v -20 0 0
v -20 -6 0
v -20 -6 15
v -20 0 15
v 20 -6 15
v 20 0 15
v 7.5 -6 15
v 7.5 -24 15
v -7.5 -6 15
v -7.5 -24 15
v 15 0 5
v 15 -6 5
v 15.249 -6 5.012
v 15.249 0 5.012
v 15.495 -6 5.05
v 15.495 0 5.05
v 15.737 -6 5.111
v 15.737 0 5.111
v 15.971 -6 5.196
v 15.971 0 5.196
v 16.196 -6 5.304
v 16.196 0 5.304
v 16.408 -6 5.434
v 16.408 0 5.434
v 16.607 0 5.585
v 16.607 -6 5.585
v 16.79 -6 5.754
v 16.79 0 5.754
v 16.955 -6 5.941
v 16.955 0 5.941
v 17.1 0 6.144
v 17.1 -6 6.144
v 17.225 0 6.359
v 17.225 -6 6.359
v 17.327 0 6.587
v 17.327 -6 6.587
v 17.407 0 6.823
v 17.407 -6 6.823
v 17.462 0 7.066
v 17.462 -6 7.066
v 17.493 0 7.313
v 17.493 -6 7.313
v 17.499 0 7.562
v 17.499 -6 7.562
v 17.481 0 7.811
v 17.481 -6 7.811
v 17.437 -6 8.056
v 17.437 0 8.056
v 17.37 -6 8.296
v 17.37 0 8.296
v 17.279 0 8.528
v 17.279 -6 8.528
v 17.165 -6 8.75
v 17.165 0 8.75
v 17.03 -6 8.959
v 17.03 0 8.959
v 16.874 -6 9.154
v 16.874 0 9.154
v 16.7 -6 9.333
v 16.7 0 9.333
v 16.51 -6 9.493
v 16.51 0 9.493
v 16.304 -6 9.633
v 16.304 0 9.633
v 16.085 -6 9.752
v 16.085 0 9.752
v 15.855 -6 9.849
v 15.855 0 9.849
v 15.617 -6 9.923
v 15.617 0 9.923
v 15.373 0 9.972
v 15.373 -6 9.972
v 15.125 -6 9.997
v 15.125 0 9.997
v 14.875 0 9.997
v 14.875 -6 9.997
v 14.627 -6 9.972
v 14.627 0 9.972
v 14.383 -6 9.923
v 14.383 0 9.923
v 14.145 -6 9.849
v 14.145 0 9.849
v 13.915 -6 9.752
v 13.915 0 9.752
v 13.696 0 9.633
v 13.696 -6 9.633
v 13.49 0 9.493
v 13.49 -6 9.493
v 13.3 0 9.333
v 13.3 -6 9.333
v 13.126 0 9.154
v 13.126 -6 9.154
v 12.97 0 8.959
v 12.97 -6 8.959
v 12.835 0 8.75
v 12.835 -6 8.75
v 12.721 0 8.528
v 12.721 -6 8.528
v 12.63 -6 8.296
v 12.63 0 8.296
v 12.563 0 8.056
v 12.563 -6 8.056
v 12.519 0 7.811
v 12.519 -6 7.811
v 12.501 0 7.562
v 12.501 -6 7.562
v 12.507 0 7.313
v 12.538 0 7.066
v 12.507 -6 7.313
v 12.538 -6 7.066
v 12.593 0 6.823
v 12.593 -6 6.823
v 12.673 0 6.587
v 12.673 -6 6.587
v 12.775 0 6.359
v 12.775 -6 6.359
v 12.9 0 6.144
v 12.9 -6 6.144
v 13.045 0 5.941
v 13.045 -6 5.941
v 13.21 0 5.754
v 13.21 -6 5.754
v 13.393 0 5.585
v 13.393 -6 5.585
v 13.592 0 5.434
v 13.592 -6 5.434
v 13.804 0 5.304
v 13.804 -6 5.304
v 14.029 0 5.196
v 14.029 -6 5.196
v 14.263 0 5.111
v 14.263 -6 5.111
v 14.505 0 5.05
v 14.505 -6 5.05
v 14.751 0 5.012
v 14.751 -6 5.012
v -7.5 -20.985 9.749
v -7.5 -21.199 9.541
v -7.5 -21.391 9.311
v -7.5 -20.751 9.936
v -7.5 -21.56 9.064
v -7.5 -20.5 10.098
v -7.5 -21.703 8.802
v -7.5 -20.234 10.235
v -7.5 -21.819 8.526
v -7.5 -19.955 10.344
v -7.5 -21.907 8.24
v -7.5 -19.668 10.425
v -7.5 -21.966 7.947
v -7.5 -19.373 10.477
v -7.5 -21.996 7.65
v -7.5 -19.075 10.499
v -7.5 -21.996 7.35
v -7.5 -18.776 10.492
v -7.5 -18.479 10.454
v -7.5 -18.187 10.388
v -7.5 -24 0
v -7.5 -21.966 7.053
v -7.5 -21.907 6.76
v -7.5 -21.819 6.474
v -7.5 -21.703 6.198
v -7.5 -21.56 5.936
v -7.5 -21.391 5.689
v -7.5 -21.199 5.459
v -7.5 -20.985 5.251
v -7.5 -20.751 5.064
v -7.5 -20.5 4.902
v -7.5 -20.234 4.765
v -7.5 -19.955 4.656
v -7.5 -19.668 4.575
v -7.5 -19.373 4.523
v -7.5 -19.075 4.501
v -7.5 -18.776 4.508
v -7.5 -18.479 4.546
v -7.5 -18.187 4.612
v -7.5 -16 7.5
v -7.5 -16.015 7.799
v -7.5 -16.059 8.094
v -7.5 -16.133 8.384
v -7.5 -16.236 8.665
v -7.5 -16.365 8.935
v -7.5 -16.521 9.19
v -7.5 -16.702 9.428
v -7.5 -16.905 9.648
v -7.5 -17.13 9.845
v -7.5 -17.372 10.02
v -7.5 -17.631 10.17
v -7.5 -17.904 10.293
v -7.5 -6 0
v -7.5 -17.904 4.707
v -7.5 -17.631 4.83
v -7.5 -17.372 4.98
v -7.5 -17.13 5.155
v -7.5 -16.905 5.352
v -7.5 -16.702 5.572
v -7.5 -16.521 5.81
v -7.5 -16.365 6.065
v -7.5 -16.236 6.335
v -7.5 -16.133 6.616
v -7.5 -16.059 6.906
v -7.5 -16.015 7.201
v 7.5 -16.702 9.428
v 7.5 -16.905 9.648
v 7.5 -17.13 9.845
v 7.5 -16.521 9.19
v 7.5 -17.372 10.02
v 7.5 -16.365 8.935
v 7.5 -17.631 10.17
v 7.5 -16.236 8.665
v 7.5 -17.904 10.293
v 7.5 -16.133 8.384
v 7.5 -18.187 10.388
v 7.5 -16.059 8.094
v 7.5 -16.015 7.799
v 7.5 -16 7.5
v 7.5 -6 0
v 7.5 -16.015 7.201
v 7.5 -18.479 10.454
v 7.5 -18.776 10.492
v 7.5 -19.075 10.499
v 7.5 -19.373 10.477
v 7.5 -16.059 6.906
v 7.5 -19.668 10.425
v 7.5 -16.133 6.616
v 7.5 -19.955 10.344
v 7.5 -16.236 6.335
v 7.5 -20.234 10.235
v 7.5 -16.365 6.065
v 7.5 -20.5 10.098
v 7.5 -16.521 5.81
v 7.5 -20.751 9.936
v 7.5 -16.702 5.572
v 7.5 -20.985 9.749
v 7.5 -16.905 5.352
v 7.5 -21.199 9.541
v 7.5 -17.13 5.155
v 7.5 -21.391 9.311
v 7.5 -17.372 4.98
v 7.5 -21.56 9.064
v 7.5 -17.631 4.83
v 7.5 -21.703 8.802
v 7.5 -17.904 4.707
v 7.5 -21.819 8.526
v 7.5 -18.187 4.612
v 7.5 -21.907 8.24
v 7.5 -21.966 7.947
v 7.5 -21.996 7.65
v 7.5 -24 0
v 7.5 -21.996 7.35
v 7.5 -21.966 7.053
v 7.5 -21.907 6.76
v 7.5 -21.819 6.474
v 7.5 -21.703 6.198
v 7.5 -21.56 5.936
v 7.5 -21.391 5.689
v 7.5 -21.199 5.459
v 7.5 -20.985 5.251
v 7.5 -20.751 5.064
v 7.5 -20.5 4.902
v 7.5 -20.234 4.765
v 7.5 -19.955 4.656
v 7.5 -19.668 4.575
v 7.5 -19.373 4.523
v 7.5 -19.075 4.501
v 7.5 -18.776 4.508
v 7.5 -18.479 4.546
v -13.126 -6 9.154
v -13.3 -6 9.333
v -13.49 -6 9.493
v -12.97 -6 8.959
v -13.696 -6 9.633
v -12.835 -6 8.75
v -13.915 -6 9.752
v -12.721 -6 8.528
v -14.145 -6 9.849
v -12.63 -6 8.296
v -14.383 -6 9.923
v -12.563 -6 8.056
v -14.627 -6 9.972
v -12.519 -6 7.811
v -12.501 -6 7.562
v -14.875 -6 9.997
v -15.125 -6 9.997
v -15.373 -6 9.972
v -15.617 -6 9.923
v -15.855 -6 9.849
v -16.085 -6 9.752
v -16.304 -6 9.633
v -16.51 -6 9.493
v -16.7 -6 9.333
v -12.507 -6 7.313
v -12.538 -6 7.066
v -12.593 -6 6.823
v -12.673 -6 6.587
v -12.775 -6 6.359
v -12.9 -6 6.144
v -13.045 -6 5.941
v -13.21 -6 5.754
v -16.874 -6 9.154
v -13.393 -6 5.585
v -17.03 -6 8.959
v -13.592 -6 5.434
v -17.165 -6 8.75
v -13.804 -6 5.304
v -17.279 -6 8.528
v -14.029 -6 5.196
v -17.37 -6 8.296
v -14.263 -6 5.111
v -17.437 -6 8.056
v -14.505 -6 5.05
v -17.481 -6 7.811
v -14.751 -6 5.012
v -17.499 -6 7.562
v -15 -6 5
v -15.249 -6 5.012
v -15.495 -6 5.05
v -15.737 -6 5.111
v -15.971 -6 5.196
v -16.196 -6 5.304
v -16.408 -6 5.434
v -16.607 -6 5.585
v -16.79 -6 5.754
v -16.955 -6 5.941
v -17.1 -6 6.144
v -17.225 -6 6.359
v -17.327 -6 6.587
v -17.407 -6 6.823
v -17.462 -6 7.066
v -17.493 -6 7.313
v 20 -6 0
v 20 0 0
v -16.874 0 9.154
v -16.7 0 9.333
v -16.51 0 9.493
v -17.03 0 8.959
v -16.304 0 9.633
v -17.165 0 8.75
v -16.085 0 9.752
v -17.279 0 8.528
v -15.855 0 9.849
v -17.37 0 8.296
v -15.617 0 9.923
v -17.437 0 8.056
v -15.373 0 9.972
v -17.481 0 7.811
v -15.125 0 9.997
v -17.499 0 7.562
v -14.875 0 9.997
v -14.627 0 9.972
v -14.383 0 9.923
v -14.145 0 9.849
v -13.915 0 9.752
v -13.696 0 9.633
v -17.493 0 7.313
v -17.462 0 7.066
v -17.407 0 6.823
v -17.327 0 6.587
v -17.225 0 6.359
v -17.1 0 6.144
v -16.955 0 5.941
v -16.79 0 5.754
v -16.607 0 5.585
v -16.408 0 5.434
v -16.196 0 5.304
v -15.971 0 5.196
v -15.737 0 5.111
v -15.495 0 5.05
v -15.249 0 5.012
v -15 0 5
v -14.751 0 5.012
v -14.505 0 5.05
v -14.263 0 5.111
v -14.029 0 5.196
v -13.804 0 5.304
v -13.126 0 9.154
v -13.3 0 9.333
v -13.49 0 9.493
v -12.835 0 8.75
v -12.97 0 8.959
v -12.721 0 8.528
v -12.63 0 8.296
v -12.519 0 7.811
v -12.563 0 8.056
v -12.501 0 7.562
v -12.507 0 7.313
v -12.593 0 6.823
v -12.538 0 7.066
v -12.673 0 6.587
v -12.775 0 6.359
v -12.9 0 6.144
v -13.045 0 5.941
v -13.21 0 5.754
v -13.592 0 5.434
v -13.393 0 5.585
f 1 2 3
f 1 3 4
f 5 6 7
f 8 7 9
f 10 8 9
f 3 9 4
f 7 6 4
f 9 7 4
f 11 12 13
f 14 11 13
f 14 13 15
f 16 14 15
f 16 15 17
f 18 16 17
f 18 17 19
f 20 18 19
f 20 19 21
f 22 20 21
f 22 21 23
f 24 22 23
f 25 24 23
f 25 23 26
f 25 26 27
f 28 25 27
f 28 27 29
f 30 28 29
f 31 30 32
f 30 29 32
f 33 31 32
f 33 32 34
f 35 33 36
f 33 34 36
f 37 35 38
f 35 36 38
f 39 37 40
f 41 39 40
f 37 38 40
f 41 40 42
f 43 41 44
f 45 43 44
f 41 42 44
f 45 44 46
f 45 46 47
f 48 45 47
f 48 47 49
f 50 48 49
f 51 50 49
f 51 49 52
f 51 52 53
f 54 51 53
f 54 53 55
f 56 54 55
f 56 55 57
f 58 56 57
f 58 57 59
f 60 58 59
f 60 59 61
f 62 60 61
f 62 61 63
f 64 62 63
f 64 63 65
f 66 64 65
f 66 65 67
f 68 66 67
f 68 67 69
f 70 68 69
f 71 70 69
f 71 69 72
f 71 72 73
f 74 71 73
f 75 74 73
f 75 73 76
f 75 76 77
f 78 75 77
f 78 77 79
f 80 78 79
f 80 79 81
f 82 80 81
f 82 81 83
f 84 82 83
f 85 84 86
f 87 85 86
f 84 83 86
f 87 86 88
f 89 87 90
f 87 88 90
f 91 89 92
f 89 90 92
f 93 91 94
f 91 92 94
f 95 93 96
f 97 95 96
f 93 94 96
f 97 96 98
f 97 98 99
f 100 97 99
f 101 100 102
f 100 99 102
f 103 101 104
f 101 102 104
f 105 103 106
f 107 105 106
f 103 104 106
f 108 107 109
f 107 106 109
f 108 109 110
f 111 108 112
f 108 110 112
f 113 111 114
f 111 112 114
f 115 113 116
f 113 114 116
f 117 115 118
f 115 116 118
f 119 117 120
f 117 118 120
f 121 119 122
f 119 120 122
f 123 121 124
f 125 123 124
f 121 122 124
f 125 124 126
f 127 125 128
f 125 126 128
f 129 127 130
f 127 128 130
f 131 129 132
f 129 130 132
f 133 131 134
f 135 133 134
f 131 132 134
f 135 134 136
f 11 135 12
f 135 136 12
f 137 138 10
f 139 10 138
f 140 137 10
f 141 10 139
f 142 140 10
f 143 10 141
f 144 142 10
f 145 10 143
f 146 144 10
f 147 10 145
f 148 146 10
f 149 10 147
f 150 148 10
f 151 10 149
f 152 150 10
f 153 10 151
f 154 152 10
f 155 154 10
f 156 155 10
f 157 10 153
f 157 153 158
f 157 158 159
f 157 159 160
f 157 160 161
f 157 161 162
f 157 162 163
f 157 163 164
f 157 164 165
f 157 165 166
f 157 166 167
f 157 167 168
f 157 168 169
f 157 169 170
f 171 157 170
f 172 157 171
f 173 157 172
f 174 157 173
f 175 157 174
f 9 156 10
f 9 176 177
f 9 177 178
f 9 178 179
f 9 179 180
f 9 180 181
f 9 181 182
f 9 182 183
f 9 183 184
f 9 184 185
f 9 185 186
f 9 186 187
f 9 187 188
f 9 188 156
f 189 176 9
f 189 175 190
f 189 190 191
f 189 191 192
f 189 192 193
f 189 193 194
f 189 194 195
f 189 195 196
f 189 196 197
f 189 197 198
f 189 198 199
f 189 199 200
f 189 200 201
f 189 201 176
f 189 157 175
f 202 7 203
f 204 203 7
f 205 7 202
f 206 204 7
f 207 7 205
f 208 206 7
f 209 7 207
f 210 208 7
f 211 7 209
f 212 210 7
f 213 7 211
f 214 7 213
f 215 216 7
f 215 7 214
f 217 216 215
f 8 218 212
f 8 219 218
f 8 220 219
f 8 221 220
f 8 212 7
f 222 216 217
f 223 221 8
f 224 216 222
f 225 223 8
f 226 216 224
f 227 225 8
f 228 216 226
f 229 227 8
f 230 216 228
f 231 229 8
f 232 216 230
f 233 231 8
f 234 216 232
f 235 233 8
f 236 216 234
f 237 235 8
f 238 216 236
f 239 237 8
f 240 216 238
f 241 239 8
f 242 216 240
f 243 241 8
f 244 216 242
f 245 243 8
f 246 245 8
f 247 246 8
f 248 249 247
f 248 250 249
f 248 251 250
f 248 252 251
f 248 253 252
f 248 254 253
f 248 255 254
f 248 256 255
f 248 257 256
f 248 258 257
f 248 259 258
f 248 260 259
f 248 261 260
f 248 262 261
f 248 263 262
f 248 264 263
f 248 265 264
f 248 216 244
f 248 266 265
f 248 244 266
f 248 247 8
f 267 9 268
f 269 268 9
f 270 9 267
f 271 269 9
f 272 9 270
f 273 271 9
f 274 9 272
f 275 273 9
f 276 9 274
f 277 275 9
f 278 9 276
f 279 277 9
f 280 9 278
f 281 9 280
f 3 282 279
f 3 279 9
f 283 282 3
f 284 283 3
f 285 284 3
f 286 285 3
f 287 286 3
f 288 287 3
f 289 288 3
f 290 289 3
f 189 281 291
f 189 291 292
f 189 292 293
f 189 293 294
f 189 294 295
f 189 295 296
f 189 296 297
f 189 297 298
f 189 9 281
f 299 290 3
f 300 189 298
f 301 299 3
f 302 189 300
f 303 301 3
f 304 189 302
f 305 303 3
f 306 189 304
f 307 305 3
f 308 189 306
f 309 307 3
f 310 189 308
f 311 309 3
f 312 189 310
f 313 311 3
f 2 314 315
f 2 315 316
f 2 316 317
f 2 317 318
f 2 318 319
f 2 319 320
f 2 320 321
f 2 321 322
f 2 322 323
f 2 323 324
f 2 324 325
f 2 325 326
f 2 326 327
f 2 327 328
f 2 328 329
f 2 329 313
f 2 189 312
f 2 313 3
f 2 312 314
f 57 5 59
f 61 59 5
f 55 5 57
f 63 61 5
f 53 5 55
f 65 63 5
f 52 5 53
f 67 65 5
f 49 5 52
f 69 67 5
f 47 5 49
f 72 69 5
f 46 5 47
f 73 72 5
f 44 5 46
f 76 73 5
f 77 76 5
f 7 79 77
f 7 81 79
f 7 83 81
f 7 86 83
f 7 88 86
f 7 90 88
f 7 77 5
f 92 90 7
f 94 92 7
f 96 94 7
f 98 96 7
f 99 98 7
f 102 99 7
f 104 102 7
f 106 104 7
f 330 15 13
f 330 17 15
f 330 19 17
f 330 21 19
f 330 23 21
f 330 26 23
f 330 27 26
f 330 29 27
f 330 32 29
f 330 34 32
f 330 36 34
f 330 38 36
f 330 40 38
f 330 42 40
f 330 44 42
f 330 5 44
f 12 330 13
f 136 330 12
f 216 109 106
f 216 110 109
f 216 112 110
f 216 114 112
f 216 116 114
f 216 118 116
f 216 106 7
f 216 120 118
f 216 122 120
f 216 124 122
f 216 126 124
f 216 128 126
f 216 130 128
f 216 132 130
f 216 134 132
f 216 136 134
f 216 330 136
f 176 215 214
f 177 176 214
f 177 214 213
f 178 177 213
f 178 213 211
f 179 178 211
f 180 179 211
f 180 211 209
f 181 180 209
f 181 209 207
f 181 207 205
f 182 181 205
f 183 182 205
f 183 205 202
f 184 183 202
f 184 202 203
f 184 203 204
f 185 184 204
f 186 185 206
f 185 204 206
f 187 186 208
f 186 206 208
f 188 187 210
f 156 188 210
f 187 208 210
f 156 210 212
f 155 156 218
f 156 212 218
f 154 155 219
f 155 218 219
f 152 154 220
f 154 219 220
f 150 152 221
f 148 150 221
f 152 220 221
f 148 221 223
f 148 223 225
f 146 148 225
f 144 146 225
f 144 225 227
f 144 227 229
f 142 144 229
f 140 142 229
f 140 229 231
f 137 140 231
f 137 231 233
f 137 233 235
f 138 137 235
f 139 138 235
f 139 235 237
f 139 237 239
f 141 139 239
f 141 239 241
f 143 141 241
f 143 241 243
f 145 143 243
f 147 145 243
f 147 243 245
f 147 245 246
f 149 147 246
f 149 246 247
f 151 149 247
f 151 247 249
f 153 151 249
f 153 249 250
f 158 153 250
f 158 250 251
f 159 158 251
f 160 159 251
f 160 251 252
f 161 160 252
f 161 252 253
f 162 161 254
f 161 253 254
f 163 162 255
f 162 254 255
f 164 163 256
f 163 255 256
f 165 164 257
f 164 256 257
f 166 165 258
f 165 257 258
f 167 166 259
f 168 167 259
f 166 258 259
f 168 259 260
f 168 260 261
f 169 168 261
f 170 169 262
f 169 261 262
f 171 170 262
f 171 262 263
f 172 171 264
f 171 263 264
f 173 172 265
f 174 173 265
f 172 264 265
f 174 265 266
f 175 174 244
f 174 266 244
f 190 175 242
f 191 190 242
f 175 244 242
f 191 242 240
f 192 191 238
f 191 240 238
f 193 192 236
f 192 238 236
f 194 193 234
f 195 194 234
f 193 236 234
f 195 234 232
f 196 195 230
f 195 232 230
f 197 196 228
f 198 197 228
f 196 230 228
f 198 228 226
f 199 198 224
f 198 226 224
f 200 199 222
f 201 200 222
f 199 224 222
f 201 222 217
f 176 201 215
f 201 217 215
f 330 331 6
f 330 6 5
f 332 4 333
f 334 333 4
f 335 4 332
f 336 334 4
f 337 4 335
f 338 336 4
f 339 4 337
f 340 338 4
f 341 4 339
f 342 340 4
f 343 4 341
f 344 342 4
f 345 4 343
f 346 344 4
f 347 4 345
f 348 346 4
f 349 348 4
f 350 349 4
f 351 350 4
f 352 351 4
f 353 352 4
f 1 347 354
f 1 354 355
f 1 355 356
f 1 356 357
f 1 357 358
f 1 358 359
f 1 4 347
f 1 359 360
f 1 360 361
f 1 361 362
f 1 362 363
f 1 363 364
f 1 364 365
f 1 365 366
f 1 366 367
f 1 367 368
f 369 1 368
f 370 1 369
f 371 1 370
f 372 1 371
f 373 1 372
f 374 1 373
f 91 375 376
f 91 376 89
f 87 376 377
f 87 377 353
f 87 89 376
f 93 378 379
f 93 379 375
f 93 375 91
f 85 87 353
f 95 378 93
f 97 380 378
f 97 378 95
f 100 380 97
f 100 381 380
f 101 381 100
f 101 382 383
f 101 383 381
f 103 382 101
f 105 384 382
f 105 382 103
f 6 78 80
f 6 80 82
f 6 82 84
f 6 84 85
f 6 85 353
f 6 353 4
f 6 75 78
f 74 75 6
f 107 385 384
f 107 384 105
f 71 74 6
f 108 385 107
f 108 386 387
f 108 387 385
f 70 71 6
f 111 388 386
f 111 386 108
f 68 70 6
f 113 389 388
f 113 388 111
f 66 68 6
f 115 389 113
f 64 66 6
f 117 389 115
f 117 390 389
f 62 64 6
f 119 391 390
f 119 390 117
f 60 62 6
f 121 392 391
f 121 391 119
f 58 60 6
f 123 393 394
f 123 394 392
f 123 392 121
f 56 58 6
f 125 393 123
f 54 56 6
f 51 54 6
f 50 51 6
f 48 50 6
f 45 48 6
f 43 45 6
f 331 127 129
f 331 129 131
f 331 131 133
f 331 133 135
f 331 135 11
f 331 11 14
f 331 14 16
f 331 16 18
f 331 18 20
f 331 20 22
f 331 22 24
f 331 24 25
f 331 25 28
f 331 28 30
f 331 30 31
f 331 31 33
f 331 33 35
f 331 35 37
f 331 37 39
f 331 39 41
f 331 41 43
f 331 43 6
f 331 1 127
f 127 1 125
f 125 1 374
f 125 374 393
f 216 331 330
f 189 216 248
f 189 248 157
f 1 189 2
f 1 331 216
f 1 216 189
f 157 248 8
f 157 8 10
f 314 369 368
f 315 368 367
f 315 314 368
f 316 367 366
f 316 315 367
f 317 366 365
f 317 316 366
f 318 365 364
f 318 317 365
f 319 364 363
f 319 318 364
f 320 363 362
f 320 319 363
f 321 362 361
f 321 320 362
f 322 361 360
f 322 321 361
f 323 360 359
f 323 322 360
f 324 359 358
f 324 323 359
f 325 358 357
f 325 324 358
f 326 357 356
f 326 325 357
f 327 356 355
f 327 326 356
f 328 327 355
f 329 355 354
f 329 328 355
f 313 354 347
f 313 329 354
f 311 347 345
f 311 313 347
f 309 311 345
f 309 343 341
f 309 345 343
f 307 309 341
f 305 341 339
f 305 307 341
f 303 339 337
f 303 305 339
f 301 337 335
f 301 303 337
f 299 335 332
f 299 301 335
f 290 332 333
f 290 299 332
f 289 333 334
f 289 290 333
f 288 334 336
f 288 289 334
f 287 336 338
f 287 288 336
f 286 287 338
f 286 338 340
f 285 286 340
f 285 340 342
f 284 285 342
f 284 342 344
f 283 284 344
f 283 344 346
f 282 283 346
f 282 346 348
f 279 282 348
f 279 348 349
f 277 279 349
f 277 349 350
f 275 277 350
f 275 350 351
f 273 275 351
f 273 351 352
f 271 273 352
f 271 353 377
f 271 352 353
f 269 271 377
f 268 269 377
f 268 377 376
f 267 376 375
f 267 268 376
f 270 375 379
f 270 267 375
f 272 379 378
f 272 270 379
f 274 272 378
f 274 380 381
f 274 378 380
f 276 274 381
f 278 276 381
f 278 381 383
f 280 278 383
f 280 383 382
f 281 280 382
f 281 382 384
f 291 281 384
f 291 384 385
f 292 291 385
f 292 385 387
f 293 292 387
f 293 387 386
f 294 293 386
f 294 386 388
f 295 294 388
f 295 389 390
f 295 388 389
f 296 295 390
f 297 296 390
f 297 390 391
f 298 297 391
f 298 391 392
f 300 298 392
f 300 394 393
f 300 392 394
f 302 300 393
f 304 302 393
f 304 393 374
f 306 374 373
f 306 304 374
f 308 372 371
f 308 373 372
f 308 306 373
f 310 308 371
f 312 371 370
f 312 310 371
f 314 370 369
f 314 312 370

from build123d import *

# Parameters (mm, degrees)
EXTRUDE_1_DEPTH     = 15
SKETCH_2_R          = 2.5
CUT_EXTRUDE_1_DEPTH = 31.805843601
SKETCH_3_R          = 3
CUT_EXTRUDE_2_DEPTH = 40.462007045


with BuildPart() as part:
    # 草图1 → 凸台-拉伸1 (new body)
    with BuildSketch(Plane.XY):
        Polygon((-20, 0), (20, 0), (20, -6), (7.5, -6), (7.5, -24), (-7.5, -24), (-7.5, -6), (-20, -6), align=None)
    extrude(amount=EXTRUDE_1_DEPTH)

    # 草图2 → 切除-拉伸1 (cut, through all)
    with BuildSketch(Plane.XZ.offset(6)):
        with Locations(Location((15, 7.5, 0), (0, 0, 270))):
            Circle(SKETCH_2_R)
    cut_extrude_1 = extrude(amount=-CUT_EXTRUDE_1_DEPTH, mode=Mode.SUBTRACT)

    # 镜向1: 切除-拉伸1 across plane
    add(cut_extrude_1.mirror(Plane(origin=(0, 0, 0), x_dir=(0, 0, 1), z_dir=(1, 0, 0))), mode=Mode.SUBTRACT)

    # 草图3 → 切除-拉伸2 (cut, through all)
    with BuildSketch(Plane(origin=(7.5, 0, 0), x_dir=(0, 0, -1), z_dir=(1, 0, 0))):
        with Locations(Location((-7.5, -19, 0), (0, 0, 90))):
            Circle(SKETCH_3_R)
    extrude(amount=-CUT_EXTRUDE_2_DEPTH, mode=Mode.SUBTRACT)


solid = part.part
